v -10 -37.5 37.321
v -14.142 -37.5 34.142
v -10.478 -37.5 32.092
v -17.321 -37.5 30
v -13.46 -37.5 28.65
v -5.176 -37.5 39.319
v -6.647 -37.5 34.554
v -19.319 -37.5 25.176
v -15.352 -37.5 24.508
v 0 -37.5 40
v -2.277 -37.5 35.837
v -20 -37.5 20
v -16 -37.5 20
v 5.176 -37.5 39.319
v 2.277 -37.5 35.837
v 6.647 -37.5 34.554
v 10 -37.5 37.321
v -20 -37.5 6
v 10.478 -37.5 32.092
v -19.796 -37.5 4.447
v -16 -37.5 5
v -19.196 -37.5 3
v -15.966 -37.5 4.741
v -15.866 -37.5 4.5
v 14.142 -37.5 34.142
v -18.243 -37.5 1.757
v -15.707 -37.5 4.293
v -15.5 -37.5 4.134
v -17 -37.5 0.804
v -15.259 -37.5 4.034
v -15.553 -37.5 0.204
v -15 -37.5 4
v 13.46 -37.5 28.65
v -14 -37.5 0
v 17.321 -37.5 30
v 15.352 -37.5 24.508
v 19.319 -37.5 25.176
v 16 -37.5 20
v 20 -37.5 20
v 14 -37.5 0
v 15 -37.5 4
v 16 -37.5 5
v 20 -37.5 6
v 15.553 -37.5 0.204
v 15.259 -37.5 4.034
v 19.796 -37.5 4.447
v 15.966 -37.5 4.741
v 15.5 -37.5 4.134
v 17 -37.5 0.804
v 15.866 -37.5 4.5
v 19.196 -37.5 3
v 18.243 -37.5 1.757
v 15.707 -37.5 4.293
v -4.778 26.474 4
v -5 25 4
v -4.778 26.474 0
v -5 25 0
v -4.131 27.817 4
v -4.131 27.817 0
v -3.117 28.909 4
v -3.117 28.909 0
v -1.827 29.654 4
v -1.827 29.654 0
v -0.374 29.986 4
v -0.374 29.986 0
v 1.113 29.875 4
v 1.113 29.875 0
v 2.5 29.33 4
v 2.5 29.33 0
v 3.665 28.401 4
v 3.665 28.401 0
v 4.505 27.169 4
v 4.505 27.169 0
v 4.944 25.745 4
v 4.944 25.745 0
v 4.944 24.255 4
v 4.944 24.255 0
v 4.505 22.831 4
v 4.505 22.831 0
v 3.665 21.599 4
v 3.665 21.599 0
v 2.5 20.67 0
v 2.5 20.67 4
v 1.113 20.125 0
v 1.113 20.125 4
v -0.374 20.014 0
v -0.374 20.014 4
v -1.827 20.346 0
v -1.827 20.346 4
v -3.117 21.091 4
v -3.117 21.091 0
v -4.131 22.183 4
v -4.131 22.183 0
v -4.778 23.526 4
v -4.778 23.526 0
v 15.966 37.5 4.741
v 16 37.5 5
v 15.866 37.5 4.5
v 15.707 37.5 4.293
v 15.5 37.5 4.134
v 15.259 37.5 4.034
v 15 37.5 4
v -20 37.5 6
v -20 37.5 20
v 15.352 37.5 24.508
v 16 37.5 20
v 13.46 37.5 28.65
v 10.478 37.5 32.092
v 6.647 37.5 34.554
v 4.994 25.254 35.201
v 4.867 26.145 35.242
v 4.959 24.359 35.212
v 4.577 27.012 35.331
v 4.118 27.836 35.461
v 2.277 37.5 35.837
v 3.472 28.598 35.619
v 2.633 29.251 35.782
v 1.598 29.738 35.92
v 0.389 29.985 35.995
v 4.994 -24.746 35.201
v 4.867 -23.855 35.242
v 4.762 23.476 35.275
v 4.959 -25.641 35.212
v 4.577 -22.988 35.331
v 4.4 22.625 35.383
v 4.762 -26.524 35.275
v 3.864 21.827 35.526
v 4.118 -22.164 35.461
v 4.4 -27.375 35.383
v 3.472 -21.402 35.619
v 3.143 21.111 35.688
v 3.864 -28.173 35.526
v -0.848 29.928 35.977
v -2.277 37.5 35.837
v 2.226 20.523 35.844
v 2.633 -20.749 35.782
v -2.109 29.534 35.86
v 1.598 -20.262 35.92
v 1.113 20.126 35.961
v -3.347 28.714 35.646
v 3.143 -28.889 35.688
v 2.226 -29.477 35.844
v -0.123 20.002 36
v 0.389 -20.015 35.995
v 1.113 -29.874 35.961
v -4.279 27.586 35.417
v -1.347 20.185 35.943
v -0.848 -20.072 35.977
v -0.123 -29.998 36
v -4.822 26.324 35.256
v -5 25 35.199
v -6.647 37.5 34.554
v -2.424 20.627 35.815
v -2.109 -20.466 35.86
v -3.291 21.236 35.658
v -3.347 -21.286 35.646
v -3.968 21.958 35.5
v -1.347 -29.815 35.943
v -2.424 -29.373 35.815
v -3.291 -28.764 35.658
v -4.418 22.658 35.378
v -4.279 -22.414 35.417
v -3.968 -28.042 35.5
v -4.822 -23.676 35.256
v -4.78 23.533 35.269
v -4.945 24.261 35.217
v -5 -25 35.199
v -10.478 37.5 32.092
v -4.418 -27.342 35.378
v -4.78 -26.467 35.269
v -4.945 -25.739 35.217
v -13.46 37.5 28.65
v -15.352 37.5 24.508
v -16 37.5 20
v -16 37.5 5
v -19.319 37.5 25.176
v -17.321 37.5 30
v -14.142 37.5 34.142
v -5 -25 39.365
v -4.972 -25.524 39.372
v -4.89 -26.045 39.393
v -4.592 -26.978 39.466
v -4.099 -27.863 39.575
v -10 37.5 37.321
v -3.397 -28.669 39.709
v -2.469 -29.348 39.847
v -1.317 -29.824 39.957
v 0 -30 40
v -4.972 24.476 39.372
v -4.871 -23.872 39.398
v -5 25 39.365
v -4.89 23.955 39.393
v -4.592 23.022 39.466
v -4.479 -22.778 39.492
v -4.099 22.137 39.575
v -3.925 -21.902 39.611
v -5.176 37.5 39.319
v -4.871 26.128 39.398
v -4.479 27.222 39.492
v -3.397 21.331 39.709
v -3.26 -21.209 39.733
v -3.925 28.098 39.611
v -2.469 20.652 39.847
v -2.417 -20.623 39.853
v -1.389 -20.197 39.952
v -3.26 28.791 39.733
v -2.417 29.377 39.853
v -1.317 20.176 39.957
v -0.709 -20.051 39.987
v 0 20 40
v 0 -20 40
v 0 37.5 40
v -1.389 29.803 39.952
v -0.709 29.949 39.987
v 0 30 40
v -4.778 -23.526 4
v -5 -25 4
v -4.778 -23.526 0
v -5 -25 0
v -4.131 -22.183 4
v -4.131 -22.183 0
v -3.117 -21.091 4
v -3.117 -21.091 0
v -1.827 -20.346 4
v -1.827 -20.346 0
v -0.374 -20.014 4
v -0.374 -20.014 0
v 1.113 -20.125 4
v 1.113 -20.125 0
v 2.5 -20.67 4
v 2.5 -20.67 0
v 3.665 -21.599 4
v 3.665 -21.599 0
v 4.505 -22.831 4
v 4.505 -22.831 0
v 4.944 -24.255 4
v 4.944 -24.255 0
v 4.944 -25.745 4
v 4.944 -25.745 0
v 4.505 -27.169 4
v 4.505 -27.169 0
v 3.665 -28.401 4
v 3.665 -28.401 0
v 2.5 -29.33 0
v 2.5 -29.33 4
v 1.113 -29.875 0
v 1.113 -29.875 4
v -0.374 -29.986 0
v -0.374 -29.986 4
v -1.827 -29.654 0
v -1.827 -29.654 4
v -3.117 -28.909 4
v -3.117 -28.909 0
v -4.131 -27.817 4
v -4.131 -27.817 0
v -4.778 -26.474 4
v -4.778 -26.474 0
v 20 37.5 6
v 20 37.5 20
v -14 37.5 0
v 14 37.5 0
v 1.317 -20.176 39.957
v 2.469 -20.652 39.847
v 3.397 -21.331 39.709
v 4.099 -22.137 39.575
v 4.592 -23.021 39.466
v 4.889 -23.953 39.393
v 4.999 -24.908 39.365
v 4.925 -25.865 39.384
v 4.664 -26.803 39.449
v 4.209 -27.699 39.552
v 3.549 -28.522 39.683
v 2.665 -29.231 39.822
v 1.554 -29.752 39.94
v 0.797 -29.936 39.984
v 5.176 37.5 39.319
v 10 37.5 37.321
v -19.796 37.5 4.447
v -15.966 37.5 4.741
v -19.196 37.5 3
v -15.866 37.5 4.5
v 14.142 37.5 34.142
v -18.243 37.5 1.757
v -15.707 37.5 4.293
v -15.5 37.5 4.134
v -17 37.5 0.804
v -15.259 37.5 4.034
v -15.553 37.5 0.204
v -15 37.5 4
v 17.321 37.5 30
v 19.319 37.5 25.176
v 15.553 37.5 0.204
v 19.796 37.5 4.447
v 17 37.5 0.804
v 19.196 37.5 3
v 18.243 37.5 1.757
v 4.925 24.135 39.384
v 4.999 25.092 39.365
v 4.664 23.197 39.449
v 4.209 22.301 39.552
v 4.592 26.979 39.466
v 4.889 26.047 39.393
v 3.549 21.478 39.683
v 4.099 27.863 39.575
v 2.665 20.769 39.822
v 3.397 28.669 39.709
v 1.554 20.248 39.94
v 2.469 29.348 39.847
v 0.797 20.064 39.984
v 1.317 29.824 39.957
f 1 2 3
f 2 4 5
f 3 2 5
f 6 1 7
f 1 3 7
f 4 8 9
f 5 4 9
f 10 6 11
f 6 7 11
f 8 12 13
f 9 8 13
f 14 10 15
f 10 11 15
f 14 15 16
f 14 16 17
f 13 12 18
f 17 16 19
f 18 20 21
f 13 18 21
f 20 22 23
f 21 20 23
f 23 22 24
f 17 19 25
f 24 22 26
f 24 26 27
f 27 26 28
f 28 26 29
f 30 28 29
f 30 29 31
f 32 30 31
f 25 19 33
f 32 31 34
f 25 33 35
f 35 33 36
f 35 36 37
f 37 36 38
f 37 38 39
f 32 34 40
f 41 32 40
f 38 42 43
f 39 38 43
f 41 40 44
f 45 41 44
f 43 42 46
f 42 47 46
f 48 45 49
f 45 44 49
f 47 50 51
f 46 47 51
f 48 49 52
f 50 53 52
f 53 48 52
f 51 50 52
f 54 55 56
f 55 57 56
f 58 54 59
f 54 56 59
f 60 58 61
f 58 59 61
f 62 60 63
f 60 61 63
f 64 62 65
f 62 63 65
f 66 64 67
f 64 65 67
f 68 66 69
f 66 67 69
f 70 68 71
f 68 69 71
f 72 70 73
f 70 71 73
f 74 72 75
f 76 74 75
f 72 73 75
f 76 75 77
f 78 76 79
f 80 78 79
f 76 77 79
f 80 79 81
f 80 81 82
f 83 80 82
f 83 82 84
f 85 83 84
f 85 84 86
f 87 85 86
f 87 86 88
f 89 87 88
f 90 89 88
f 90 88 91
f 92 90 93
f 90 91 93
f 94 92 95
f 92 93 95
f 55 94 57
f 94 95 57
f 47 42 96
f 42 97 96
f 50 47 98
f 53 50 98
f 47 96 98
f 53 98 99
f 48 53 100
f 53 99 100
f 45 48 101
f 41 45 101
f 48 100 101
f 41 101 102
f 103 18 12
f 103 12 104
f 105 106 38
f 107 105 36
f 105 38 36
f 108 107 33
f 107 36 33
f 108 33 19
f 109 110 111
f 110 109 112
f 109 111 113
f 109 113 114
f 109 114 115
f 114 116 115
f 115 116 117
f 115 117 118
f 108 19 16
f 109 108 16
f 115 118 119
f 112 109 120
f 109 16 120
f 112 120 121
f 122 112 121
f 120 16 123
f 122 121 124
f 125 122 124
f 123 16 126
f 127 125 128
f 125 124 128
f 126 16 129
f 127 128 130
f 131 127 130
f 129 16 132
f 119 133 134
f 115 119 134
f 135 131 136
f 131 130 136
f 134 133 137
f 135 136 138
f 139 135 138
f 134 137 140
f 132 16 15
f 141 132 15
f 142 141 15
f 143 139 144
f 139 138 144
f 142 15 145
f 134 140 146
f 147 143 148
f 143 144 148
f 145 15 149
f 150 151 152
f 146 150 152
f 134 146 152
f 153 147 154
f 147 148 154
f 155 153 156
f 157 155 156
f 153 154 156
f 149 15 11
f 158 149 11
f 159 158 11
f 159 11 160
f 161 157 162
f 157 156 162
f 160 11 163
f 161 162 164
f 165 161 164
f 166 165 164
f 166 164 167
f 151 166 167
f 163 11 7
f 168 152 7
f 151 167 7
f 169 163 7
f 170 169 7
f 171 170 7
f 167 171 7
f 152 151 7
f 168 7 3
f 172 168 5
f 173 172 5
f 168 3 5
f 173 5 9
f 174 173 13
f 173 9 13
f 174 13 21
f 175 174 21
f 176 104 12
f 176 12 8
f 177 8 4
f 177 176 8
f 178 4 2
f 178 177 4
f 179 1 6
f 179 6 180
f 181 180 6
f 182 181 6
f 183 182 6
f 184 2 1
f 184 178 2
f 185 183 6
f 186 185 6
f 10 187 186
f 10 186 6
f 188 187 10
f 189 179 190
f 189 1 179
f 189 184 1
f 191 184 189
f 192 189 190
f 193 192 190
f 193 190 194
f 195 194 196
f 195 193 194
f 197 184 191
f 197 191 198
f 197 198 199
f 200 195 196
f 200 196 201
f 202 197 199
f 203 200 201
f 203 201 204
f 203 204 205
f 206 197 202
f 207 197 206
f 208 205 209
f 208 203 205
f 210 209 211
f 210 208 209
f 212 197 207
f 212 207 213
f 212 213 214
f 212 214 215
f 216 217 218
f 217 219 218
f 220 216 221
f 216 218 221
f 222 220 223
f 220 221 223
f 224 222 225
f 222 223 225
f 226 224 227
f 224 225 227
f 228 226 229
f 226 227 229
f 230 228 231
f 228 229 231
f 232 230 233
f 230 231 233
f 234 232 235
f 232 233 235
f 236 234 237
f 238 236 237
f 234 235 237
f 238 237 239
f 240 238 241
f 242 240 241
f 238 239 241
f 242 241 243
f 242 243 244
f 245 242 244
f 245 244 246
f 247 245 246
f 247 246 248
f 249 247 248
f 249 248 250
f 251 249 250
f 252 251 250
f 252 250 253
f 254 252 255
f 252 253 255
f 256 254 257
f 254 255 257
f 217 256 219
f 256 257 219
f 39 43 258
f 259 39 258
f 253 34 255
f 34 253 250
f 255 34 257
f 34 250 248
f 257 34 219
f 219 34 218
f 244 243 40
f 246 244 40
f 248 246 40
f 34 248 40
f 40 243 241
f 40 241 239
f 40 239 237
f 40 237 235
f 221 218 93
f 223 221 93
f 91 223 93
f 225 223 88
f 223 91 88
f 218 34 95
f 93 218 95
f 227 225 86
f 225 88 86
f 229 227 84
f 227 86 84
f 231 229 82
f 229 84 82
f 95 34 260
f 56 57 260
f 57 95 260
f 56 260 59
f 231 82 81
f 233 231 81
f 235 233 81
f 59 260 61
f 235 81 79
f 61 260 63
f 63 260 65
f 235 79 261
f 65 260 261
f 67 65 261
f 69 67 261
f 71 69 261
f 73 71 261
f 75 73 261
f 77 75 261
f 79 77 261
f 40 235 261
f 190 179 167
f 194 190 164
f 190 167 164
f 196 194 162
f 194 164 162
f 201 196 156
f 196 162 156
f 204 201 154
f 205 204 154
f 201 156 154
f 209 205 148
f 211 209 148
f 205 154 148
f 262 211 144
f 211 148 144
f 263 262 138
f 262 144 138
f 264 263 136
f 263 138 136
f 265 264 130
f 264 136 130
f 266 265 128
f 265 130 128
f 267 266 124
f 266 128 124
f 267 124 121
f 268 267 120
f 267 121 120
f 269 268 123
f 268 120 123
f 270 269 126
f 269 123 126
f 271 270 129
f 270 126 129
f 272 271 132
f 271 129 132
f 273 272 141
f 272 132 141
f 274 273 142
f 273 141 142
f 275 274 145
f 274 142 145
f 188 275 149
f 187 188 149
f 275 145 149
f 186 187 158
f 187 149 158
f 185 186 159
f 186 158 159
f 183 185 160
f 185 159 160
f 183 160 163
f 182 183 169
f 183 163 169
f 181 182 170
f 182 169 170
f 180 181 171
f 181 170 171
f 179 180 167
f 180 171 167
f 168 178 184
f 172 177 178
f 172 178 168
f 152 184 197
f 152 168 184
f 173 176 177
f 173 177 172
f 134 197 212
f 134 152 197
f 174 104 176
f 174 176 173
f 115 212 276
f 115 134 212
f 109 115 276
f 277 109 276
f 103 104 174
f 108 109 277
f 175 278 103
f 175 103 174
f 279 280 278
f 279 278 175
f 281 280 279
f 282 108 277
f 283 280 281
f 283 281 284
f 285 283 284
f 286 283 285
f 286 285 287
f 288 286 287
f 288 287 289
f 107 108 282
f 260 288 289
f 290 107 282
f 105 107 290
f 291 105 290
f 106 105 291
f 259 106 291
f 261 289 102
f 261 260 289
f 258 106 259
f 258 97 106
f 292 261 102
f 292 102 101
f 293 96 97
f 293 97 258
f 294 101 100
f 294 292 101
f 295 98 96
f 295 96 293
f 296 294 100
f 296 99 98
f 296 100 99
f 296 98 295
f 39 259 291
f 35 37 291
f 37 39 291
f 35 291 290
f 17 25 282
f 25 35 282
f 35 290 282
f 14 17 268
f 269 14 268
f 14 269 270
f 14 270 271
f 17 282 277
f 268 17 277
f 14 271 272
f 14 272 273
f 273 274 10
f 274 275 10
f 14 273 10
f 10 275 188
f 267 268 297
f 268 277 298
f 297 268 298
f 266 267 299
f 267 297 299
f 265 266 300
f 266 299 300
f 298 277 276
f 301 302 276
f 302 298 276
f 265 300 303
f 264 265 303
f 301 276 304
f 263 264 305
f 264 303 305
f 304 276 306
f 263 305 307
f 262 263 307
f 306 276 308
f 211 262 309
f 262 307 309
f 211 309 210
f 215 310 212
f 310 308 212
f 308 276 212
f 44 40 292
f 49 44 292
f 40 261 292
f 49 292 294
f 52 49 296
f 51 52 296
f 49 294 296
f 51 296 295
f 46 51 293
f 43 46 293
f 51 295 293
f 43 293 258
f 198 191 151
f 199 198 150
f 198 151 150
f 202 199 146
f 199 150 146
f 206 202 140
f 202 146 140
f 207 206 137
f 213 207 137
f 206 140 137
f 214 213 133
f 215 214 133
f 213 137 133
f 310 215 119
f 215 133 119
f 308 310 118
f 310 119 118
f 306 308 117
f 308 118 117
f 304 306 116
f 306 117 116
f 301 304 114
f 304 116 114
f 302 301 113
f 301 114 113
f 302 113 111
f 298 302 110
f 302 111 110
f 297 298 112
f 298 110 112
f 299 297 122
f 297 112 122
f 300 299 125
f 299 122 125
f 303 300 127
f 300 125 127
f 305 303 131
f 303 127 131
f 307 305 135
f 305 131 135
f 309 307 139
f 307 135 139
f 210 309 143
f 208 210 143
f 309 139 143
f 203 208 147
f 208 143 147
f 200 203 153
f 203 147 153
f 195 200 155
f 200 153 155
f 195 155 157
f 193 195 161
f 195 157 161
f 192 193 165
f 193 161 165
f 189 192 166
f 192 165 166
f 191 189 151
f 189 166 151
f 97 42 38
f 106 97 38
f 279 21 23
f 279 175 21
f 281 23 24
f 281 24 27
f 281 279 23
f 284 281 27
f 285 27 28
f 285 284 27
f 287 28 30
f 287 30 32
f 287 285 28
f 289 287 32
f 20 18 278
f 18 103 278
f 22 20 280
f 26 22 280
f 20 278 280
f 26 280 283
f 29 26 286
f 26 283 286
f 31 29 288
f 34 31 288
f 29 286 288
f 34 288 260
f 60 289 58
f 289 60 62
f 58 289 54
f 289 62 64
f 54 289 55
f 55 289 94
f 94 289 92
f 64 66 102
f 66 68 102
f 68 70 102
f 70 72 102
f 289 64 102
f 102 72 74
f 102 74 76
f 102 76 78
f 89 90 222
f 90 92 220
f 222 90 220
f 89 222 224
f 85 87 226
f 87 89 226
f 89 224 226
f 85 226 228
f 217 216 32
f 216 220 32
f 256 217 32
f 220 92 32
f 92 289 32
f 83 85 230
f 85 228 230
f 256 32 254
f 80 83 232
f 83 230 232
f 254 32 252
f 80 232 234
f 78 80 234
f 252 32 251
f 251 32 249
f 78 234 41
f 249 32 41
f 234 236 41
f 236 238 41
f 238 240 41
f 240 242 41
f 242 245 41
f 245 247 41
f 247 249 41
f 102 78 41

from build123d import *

# Parameters (mm, degrees)
F0_W        = 40
F0_H        = 75
F1_DEPTH    = 40
F3_D        = 10
F4_T1_DEPTH = 175
F5_T1_DEPTH = 175
F6_R        = 6
F8_DEPTH    = 75.0010001
F9_R        = 1


# Not quite as in the source:
# - a fillet or chamfer that OpenCascade refuses, or shapes differently, is made with other operations: its cross-section is extruded or revolved along the edge and cut away or added


with BuildPart() as f1:
    # F0 (on Top) → F1 (new body)
    with BuildSketch(Plane.XY):
        Rectangle(F0_W, F0_H)
    extrude(amount=F1_DEPTH)

    # F3 (through all)
    with Locations(Plane.XY.offset(40)):
        with Locations((0, 25), (0, -25)):
            Hole(F3_D / 2)

    # F4: fillet of radius 20 on 1 edges, made by hand

    # F4_s2 → F4_t1 (cut)
    with BuildSketch(Plane.XZ.offset(-87.5)):
        with BuildLine():
            ThreePointArc((20, 20), (14.1421356237, 34.1421356237), (0, 40))
            Line((0, 40), (20, 40))
            Line((20, 40), (20, 20))
        make_face()
    extrude(amount=F4_T1_DEPTH, mode=Mode.SUBTRACT)

    # F5: fillet of radius 20 on 1 edges, made by hand

    # F5_s2 → F5_t1 (cut)
    with BuildSketch(Plane.XZ.offset(-87.5)):
        with BuildLine():
            ThreePointArc((-20, 20), (-14.1421356237, 34.1421356237), (0, 40))
            Line((0, 40), (-20, 40))
            Line((-20, 40), (-20, 20))
        make_face()
    extrude(amount=F5_T1_DEPTH, mode=Mode.SUBTRACT)

    # F6
    f6_edges = [f1.edges().sort_by_distance(p)[0] for p in [
        (-20, 0, 0),
        (20, 0, 0),
    ]]
    fillet(f6_edges, radius=F6_R)

    # F7 (on face) → F8 (cut, through all)
    with BuildSketch(Plane.XZ.offset(37.5)):
        with BuildLine():
            Line((-16, 20), (-16, 4))
            Line((-16, 4), (16, 4))
            Line((16, 4), (16, 20))
            ThreePointArc((16, 20), (0, 36), (-16, 20))
        make_face()
    extrude(amount=-F8_DEPTH, mode=Mode.SUBTRACT)

    # F9
    f9_edges = [f1.edges().sort_by_distance(p)[0] for p in [
        (-16, 0, 4),
        (16, 0, 4),
    ]]
    fillet(f9_edges, radius=F9_R)


solid = f1.part
